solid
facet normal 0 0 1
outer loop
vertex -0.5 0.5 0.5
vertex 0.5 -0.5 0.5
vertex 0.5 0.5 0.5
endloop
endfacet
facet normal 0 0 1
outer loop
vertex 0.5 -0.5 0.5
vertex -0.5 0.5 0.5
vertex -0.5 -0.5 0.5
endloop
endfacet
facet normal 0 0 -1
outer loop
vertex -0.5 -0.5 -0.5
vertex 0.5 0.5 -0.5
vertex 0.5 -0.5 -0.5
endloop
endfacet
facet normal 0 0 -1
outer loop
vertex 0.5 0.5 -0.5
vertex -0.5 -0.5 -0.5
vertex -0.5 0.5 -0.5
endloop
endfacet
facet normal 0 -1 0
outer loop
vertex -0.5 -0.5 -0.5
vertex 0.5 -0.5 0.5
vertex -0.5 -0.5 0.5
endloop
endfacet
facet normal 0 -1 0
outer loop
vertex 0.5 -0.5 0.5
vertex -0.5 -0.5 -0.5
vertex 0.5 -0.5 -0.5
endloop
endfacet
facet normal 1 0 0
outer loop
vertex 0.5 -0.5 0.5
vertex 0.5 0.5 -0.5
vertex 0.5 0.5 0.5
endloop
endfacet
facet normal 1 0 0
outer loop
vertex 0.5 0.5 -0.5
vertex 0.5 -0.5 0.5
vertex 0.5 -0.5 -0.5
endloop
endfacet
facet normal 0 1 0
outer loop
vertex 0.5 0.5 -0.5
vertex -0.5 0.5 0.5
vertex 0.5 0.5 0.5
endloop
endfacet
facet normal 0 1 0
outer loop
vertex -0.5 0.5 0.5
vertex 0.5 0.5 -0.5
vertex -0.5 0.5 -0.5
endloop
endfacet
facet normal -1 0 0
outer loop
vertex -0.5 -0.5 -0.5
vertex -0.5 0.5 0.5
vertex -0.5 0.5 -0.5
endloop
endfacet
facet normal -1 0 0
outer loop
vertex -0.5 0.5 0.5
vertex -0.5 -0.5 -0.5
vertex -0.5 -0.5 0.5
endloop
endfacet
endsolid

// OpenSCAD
// file: ../../polysymmetrica/core/profile.scad
/*
 * This file is part of PolySymmetrica, a Polyhedral Geometry Modelling System.
 * Copyright 2025-2026 Susan Witts
 * SPDX-License-Identifier: MIT
 */

// LibFile: polysymmetrica/core/profile.scad

// Shared parameter override helpers for transform operators.
//
// INPUT FORMAT (`profile`)
// ---------------------------------
// `profile` is a list of rows. Each row targets an element kind
// ("face" | "vert" | "edge"), a selector scope, and one or more key/value
// pairs.
//
// Row schemas.
//   ["face"|"vert"|"edge", "all", ["key", value], ...]
//   ["face"|"vert"|"edge", "family", family_id, ["key", value], ...]
//   ["face"|"vert"|"edge", "id", id_or_ids, ["key", value], ...]
//
// Where.
// - `id_or_ids` may be a single index or a list of indices.
// - keys are operator-defined (examples: "df", "angle", "c", "de", "t").
//
// Precedence is fixed and deterministic:
//   id > family > all
// For the same scope/key, later rows win.
// For duplicate keys in one row, the last key/value wins.
//
// EXAMPLE INPUT
// -------------
// rows = [
//   ["face", "all", ["angle", 15]],
//   ["face", "family", 1, ["df", 0.04]],
//   ["face", "id", [2, 7], ["angle", 19]],
//   ["vert", "family", 0, ["c", 0.06]]
// ];
//
// OUTPUT FORMAT (compiled arrays)
// --------------------------------
// `ps_profile_compile_key(...)` returns a dense per-index array of length
// `count`, containing either a resolved value or `undef`.
//
// `ps_profile_compile_specs(...)` returns a list of dense arrays, one per spec,
// in the same order as `specs`.
//
// Example.
// face_fid = [0, 1, 1, 0];
// face_df = ps_profile_compile_key(rows, "face", "df", 4, face_fid);
// // => [undef, 0.04, 0.04, undef]
//
// face_angle = ps_profile_compile_key(rows, "face", "angle", 4, face_fid);
// // => [15, 15, 19, 15]
//
// specs = [
//   ["face", "df", 4, face_fid],
//   ["face", "angle", 4, face_fid]
// ];
// compiled = ps_profile_compile_specs(rows, specs);
// // => [face_df, face_angle]
//
// ACCESSOR USAGE
// --------------
// v = ps_compiled_param_get(compiled[0], face_idx); // safe bounds + undef
//
// DEBUG PRINT
// -----------
// Use `ps_profile_print(rows);` to dump normalized row interpretation.

function _ps_profile_row_kind(row) =
    (!is_list(row) || len(row) < 1) ? undef : row[0];

function _ps_profile_row_scope(row) =
    (!is_list(row) || len(row) < 2) ? undef
        : (is_string(row[1]) && (row[1] == "all" || row[1] == "family" || row[1] == "id")) ? row[1]
        : undef;

function _ps_profile_row_selector(row) =
    let(scope = _ps_profile_row_scope(row))
    (scope == "all") ? undef
        : (scope == "family") ? row[2]
        : (scope == "id") ? row[2]
        : undef;

function _ps_profile_row_kv_start(row) =
    let(scope = _ps_profile_row_scope(row))
    (scope == "family" || scope == "id") ? 3
        : (scope == "all") ? 2
        : 999999;

function _ps_profile_selector_has_id(selector, id) =
    is_undef(id) ? false
        : is_list(selector)
            ? (len([for (x = selector) if (x == id) 1]) > 0)
            : (selector == id);

function _ps_profile_row_applies(row, kind, scope, element_id=undef, family_id=undef) =
    let(
        row_kind = _ps_profile_row_kind(row),
        row_scope = _ps_profile_row_scope(row),
        selector = _ps_profile_row_selector(row)
    )
    (row_kind == kind) && (row_scope == scope) && (
        (scope == "all")
        || (scope == "family" && !is_undef(family_id) && selector == family_id)
        || (scope == "id" && _ps_profile_selector_has_id(selector, element_id))
    );

function _ps_profile_row_get(row, key) =
    let(
        start = _ps_profile_row_kv_start(row),
        vals = [
            for (i = [start:1:len(row)-1])
                let(p = row[i])
                if (is_list(p) && len(p) >= 2 && p[0] == key) p[1]
        ],
        vals2 = [for (v = vals) if (!is_undef(v)) v]
    )
    (len(vals2) == 0) ? undef : vals2[len(vals2)-1];

// Function: ps_profile_get()
// Usage:
//   result = ps_profile_get(profile, kind, key, element_id=undef, family_id=undef);
// Description:
//   Resolve one override value from a profile using fixed precedence
//   `id > family > all`, with later rows winning inside the same scope.
// Arguments:
//   profile = profile row list, or `undef` for no overrides.
//   kind = element kind to resolve: `"face"`, `"vert"`, or `"edge"`.
//   key = operator-defined parameter key such as `"df"`, `"t"`, `"c"`, or `"de"`.
//   element_id = element index used by `"id"` scoped rows.
//   family_id = classification family id used by `"family"` scoped rows.
function ps_profile_get(profile, kind, key, element_id=undef, family_id=undef) =
    let(
        rows = is_undef(profile) ? [] : profile,
        vals_all = [for (row = rows) if (_ps_profile_row_applies(row, kind, "all", element_id, family_id)) _ps_profile_row_get(row, key)],
        vals_family = [for (row = rows) if (_ps_profile_row_applies(row, kind, "family", element_id, family_id)) _ps_profile_row_get(row, key)],
        vals_id = [for (row = rows) if (_ps_profile_row_applies(row, kind, "id", element_id, family_id)) _ps_profile_row_get(row, key)],
        all2 = [for (v = vals_all) if (!is_undef(v)) v],
        fam2 = [for (v = vals_family) if (!is_undef(v)) v],
        id2 = [for (v = vals_id) if (!is_undef(v)) v],
        v_all = (len(all2) == 0) ? undef : all2[len(all2)-1],
        v_family = (len(fam2) == 0) ? undef : fam2[len(fam2)-1],
        v_id = (len(id2) == 0) ? undef : id2[len(id2)-1]
    )
    !is_undef(v_id) ? v_id
        : !is_undef(v_family) ? v_family
        : v_all;

// Function: ps_profile_count_kind()
// Usage:
//   result = ps_profile_count_kind(profile, kind);
// Description:
//   Count profile rows for one element kind.
// Arguments:
//   profile = profile row list, or `undef` for no rows.
//   kind = element kind to count: `"face"`, `"vert"`, or `"edge"`.
function ps_profile_count_kind(profile, kind) =
    is_undef(profile) ? 0
        : len([for (row = profile) if (_ps_profile_row_kind(row) == kind) 1]);

// Function: ps_profile_row_count()
// Usage:
//   result = ps_profile_row_count(profile);
// Description:
//   Count the total number of profile rows.
// Arguments:
//   profile = profile row list, or `undef` for no rows.
function ps_profile_row_count(profile) =
    is_undef(profile) ? 0 : len(profile);

// Function: ps_profile_has_scope()
// Usage:
//   result = ps_profile_has_scope(profile, kind, scope);
// Description:
//   Determine whether a profile contains at least one row for the supplied kind
//   and scope.
// Arguments:
//   profile = profile row list, or `undef` for no rows.
//   kind = element kind to inspect: `"face"`, `"vert"`, or `"edge"`.
//   scope = profile selector scope: `"all"`, `"family"`, or `"id"`.
function ps_profile_has_scope(profile, kind, scope) =
    is_undef(profile) ? false
        : (len([
            for (row = profile)
                if (_ps_profile_row_kind(row) == kind && _ps_profile_row_scope(row) == scope) 1
        ]) > 0);

// Function: ps_profile_uses_family()
// Usage:
//   result = ps_profile_uses_family(profile, kind);
// Description:
//   Convenience test for whether a profile uses family-scoped rows for one kind.
// Arguments:
//   profile = profile row list, or `undef` for no rows.
//   kind = element kind to inspect: `"face"`, `"vert"`, or `"edge"`.
function ps_profile_uses_family(profile, kind) =
    ps_profile_has_scope(profile, kind, "family");

// Function: ps_profile_compile_key()
// Usage:
//   result = ps_profile_compile_key(profile, kind, key, count, family_ids=undef);
// Description:
//   Compile one `kind`/`key` profile view into a dense lookup array.
// Arguments:
//   profile = profile row list, or `undef` for no overrides.
//   kind = element kind to compile: `"face"`, `"vert"`, or `"edge"`.
//   key = operator-defined parameter key to extract.
//   count = output array length, normally the number of elements of `kind`.
//   family_ids = optional parallel family-id array for family-scoped lookups; when omitted, family rows cannot match.
function ps_profile_compile_key(profile, kind, key, count, family_ids=undef) =
    [for (idx = [0:1:max(0, count-1)])
        ps_profile_get(
            profile,
            kind,
            key,
            idx,
            (is_undef(family_ids) || idx >= len(family_ids)) ? undef : family_ids[idx]
        )
    ];

// Compile multiple specs into dense lookup arrays.
// Spec row format.
//   [kind, key, count]
//   [kind, key, count, family_ids]
// Function: ps_profile_compile_specs()
// Usage:
//   result = ps_profile_compile_specs(profile, specs);
// Description:
//   Compile multiple profile specs into dense lookup arrays in spec order.
// Arguments:
//   profile = profile row list, or `undef` for no overrides.
//   specs = compile spec rows `[kind, key, count]` or `[kind, key, count, family_ids]`; the returned arrays preserve this order.
function ps_profile_compile_specs(profile, specs) =
    [for (spec = specs)
        ps_profile_compile_key(
            profile,
            spec[0],
            spec[1],
            spec[2],
            (len(spec) >= 4) ? spec[3] : undef
        )
    ];

// Function: ps_compiled_param_get()
// Usage:
//   result = ps_compiled_param_get(arr, idx);
// Description:
//   Safely read one compiled parameter entry with bounds checking.
// Arguments:
//   arr = compiled parameter array returned by `ps_profile_compile_key(...)`, or `undef`.
//   idx = element index to read.
function ps_compiled_param_get(arr, idx) =
    (is_undef(arr) || idx < 0 || idx >= len(arr)) ? undef : arr[idx];

// Module: ps_profile_print()
// Usage:
//   ps_profile_print(profile);
// Description:
//   Echo a normalized interpretation of a profile for debugging.
// Arguments:
//   profile = profile row list, or `undef` for no rows.
module ps_profile_print(profile) {
    rows = is_undef(profile) ? [] : profile;
    echo(str("profile: rows=", len(rows)));
    for (ri = [0:1:len(rows)-1]) {
        row = rows[ri];
        kind = _ps_profile_row_kind(row);
        scope = _ps_profile_row_scope(row);
        sel = _ps_profile_row_selector(row);
        start = _ps_profile_row_kv_start(row);
        kv = (start > len(row)-1) ? [] : [for (i = [start:1:len(row)-1]) row[i]];
        echo(str("  row#", ri, " kind=", kind, " scope=", scope, " selector=", sel, " kv=", kv));
    }
}
// main file
/*
 * This file is part of PolySymmetrica, a Polyhedral Geometry Modelling System.
 * Copyright 2025-2026 Susan Witts
 * SPDX-License-Identifier: MIT
 */

use <../../polysymmetrica/core/profile.scad>

/*
Profile basics example.

Shows that `face_fid` is a family-id array indexed by face index.
Here we use a synthetic 4-face case:

    face index:  0  1  2  3
    face_fid:   [0, 1, 1, 0]

Meaning:
- faces 0 and 3 belong to face family 0
- faces 1 and 2 belong to face family 1
*/

rows = [
    ["face", "all", ["angle", 15]],
    ["face", "family", 1, ["df", 0.04]],
    ["face", "id", [2, 3], ["angle", 19]],
    ["vert", "family", 0, ["c", 0.06]]
];

face_fid = [0, 1, 1, 0];

face_df = ps_profile_compile_key(rows, "face", "df", 4, face_fid);
face_angle = ps_profile_compile_key(rows, "face", "angle", 4, face_fid);

echo("profile example: face_fid=", face_fid);
echo("profile example: face_df=", face_df);         // [undef, 0.04, 0.04, undef]
echo("profile example: face_angle=", face_angle);   // [15, 15, 19, 19]
ps_profile_print(rows);

// Minimal geometry so this file renders to a valid STL target.
cube(1, center=true);
